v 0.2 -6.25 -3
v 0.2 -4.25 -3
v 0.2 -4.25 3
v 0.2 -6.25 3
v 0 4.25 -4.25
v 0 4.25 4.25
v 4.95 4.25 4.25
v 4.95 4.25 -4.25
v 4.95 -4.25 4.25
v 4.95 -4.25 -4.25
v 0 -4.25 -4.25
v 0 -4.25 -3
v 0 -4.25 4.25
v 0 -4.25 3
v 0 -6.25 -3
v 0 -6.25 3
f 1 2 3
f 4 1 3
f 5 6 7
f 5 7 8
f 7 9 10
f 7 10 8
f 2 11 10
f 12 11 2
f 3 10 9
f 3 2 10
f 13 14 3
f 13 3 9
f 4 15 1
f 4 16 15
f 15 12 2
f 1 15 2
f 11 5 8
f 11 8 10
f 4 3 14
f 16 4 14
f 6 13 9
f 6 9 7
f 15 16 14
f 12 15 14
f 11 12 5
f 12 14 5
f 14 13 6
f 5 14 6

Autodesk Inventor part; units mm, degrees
ref_plane "YZ Plane" through (0, 0, 0) normal (1, 0, 0) x (0, 1, 0)
ref_plane "XZ Plane" through (0, 0, 0) normal (0, 1, 0) x (-1, 0, 0)
ref_plane "XY Plane" through (0, 0, 0) normal (0, 0, 1) x (1, 0, 0)
sketch "Эскиз1" plane through (0, 0, 0) normal (1, 0, 0) x (0, 1, 0)
  line L0 (-4.25, 4.25) -> (4.25, 4.25)
  line L1 (4.25, 4.25) -> (4.25, -4.25)
  line L2 (4.25, -4.25) -> (-4.25, -4.25)
  line L3 (-4.25, -4.25) -> (-4.25, 4.25)
  line L4 (-4.25, 4.25) -> (4.25, -4.25) construction
  line L5 (4.25, 4.25) -> (-4.25, -4.25) construction
  point P0 (0, 0)
  dimension "d0" = 8.5
  dimension "d1" = 8.5
extrude "Выдавливание1" add sketch "Эскиз1" along normal blind 4.95
sketch "Эскиз2" plane through (0, -4.25, -4.25) normal (0, -1, 0) x (1, 0, 0)
  line L0 (0.2, 7.25) -> (0, 7.25)
  line L1 (0, 7.25) -> (0, 1.25)
  line L2 (0, 1.25) -> (0.2, 1.25)
  line L3 (0.2, 1.25) -> (0.2, 7.25)
  line L4 (0.2, 7.25) -> (0, 1.25) construction
  line L5 (0, 7.25) -> (0.2, 1.25) construction
  line L6 (0, 8.5) -> (0, 0) projected
  point P0 (0, 4.25)
  point P1 (0.1, 4.25)
  point P2 (0, 4.25)
  dimension "d4" = 0.2
  dimension "d5" = 6
extrude "Выдавливание2" add sketch "Эскиз2" along normal blind 2
properties part number "camera"
